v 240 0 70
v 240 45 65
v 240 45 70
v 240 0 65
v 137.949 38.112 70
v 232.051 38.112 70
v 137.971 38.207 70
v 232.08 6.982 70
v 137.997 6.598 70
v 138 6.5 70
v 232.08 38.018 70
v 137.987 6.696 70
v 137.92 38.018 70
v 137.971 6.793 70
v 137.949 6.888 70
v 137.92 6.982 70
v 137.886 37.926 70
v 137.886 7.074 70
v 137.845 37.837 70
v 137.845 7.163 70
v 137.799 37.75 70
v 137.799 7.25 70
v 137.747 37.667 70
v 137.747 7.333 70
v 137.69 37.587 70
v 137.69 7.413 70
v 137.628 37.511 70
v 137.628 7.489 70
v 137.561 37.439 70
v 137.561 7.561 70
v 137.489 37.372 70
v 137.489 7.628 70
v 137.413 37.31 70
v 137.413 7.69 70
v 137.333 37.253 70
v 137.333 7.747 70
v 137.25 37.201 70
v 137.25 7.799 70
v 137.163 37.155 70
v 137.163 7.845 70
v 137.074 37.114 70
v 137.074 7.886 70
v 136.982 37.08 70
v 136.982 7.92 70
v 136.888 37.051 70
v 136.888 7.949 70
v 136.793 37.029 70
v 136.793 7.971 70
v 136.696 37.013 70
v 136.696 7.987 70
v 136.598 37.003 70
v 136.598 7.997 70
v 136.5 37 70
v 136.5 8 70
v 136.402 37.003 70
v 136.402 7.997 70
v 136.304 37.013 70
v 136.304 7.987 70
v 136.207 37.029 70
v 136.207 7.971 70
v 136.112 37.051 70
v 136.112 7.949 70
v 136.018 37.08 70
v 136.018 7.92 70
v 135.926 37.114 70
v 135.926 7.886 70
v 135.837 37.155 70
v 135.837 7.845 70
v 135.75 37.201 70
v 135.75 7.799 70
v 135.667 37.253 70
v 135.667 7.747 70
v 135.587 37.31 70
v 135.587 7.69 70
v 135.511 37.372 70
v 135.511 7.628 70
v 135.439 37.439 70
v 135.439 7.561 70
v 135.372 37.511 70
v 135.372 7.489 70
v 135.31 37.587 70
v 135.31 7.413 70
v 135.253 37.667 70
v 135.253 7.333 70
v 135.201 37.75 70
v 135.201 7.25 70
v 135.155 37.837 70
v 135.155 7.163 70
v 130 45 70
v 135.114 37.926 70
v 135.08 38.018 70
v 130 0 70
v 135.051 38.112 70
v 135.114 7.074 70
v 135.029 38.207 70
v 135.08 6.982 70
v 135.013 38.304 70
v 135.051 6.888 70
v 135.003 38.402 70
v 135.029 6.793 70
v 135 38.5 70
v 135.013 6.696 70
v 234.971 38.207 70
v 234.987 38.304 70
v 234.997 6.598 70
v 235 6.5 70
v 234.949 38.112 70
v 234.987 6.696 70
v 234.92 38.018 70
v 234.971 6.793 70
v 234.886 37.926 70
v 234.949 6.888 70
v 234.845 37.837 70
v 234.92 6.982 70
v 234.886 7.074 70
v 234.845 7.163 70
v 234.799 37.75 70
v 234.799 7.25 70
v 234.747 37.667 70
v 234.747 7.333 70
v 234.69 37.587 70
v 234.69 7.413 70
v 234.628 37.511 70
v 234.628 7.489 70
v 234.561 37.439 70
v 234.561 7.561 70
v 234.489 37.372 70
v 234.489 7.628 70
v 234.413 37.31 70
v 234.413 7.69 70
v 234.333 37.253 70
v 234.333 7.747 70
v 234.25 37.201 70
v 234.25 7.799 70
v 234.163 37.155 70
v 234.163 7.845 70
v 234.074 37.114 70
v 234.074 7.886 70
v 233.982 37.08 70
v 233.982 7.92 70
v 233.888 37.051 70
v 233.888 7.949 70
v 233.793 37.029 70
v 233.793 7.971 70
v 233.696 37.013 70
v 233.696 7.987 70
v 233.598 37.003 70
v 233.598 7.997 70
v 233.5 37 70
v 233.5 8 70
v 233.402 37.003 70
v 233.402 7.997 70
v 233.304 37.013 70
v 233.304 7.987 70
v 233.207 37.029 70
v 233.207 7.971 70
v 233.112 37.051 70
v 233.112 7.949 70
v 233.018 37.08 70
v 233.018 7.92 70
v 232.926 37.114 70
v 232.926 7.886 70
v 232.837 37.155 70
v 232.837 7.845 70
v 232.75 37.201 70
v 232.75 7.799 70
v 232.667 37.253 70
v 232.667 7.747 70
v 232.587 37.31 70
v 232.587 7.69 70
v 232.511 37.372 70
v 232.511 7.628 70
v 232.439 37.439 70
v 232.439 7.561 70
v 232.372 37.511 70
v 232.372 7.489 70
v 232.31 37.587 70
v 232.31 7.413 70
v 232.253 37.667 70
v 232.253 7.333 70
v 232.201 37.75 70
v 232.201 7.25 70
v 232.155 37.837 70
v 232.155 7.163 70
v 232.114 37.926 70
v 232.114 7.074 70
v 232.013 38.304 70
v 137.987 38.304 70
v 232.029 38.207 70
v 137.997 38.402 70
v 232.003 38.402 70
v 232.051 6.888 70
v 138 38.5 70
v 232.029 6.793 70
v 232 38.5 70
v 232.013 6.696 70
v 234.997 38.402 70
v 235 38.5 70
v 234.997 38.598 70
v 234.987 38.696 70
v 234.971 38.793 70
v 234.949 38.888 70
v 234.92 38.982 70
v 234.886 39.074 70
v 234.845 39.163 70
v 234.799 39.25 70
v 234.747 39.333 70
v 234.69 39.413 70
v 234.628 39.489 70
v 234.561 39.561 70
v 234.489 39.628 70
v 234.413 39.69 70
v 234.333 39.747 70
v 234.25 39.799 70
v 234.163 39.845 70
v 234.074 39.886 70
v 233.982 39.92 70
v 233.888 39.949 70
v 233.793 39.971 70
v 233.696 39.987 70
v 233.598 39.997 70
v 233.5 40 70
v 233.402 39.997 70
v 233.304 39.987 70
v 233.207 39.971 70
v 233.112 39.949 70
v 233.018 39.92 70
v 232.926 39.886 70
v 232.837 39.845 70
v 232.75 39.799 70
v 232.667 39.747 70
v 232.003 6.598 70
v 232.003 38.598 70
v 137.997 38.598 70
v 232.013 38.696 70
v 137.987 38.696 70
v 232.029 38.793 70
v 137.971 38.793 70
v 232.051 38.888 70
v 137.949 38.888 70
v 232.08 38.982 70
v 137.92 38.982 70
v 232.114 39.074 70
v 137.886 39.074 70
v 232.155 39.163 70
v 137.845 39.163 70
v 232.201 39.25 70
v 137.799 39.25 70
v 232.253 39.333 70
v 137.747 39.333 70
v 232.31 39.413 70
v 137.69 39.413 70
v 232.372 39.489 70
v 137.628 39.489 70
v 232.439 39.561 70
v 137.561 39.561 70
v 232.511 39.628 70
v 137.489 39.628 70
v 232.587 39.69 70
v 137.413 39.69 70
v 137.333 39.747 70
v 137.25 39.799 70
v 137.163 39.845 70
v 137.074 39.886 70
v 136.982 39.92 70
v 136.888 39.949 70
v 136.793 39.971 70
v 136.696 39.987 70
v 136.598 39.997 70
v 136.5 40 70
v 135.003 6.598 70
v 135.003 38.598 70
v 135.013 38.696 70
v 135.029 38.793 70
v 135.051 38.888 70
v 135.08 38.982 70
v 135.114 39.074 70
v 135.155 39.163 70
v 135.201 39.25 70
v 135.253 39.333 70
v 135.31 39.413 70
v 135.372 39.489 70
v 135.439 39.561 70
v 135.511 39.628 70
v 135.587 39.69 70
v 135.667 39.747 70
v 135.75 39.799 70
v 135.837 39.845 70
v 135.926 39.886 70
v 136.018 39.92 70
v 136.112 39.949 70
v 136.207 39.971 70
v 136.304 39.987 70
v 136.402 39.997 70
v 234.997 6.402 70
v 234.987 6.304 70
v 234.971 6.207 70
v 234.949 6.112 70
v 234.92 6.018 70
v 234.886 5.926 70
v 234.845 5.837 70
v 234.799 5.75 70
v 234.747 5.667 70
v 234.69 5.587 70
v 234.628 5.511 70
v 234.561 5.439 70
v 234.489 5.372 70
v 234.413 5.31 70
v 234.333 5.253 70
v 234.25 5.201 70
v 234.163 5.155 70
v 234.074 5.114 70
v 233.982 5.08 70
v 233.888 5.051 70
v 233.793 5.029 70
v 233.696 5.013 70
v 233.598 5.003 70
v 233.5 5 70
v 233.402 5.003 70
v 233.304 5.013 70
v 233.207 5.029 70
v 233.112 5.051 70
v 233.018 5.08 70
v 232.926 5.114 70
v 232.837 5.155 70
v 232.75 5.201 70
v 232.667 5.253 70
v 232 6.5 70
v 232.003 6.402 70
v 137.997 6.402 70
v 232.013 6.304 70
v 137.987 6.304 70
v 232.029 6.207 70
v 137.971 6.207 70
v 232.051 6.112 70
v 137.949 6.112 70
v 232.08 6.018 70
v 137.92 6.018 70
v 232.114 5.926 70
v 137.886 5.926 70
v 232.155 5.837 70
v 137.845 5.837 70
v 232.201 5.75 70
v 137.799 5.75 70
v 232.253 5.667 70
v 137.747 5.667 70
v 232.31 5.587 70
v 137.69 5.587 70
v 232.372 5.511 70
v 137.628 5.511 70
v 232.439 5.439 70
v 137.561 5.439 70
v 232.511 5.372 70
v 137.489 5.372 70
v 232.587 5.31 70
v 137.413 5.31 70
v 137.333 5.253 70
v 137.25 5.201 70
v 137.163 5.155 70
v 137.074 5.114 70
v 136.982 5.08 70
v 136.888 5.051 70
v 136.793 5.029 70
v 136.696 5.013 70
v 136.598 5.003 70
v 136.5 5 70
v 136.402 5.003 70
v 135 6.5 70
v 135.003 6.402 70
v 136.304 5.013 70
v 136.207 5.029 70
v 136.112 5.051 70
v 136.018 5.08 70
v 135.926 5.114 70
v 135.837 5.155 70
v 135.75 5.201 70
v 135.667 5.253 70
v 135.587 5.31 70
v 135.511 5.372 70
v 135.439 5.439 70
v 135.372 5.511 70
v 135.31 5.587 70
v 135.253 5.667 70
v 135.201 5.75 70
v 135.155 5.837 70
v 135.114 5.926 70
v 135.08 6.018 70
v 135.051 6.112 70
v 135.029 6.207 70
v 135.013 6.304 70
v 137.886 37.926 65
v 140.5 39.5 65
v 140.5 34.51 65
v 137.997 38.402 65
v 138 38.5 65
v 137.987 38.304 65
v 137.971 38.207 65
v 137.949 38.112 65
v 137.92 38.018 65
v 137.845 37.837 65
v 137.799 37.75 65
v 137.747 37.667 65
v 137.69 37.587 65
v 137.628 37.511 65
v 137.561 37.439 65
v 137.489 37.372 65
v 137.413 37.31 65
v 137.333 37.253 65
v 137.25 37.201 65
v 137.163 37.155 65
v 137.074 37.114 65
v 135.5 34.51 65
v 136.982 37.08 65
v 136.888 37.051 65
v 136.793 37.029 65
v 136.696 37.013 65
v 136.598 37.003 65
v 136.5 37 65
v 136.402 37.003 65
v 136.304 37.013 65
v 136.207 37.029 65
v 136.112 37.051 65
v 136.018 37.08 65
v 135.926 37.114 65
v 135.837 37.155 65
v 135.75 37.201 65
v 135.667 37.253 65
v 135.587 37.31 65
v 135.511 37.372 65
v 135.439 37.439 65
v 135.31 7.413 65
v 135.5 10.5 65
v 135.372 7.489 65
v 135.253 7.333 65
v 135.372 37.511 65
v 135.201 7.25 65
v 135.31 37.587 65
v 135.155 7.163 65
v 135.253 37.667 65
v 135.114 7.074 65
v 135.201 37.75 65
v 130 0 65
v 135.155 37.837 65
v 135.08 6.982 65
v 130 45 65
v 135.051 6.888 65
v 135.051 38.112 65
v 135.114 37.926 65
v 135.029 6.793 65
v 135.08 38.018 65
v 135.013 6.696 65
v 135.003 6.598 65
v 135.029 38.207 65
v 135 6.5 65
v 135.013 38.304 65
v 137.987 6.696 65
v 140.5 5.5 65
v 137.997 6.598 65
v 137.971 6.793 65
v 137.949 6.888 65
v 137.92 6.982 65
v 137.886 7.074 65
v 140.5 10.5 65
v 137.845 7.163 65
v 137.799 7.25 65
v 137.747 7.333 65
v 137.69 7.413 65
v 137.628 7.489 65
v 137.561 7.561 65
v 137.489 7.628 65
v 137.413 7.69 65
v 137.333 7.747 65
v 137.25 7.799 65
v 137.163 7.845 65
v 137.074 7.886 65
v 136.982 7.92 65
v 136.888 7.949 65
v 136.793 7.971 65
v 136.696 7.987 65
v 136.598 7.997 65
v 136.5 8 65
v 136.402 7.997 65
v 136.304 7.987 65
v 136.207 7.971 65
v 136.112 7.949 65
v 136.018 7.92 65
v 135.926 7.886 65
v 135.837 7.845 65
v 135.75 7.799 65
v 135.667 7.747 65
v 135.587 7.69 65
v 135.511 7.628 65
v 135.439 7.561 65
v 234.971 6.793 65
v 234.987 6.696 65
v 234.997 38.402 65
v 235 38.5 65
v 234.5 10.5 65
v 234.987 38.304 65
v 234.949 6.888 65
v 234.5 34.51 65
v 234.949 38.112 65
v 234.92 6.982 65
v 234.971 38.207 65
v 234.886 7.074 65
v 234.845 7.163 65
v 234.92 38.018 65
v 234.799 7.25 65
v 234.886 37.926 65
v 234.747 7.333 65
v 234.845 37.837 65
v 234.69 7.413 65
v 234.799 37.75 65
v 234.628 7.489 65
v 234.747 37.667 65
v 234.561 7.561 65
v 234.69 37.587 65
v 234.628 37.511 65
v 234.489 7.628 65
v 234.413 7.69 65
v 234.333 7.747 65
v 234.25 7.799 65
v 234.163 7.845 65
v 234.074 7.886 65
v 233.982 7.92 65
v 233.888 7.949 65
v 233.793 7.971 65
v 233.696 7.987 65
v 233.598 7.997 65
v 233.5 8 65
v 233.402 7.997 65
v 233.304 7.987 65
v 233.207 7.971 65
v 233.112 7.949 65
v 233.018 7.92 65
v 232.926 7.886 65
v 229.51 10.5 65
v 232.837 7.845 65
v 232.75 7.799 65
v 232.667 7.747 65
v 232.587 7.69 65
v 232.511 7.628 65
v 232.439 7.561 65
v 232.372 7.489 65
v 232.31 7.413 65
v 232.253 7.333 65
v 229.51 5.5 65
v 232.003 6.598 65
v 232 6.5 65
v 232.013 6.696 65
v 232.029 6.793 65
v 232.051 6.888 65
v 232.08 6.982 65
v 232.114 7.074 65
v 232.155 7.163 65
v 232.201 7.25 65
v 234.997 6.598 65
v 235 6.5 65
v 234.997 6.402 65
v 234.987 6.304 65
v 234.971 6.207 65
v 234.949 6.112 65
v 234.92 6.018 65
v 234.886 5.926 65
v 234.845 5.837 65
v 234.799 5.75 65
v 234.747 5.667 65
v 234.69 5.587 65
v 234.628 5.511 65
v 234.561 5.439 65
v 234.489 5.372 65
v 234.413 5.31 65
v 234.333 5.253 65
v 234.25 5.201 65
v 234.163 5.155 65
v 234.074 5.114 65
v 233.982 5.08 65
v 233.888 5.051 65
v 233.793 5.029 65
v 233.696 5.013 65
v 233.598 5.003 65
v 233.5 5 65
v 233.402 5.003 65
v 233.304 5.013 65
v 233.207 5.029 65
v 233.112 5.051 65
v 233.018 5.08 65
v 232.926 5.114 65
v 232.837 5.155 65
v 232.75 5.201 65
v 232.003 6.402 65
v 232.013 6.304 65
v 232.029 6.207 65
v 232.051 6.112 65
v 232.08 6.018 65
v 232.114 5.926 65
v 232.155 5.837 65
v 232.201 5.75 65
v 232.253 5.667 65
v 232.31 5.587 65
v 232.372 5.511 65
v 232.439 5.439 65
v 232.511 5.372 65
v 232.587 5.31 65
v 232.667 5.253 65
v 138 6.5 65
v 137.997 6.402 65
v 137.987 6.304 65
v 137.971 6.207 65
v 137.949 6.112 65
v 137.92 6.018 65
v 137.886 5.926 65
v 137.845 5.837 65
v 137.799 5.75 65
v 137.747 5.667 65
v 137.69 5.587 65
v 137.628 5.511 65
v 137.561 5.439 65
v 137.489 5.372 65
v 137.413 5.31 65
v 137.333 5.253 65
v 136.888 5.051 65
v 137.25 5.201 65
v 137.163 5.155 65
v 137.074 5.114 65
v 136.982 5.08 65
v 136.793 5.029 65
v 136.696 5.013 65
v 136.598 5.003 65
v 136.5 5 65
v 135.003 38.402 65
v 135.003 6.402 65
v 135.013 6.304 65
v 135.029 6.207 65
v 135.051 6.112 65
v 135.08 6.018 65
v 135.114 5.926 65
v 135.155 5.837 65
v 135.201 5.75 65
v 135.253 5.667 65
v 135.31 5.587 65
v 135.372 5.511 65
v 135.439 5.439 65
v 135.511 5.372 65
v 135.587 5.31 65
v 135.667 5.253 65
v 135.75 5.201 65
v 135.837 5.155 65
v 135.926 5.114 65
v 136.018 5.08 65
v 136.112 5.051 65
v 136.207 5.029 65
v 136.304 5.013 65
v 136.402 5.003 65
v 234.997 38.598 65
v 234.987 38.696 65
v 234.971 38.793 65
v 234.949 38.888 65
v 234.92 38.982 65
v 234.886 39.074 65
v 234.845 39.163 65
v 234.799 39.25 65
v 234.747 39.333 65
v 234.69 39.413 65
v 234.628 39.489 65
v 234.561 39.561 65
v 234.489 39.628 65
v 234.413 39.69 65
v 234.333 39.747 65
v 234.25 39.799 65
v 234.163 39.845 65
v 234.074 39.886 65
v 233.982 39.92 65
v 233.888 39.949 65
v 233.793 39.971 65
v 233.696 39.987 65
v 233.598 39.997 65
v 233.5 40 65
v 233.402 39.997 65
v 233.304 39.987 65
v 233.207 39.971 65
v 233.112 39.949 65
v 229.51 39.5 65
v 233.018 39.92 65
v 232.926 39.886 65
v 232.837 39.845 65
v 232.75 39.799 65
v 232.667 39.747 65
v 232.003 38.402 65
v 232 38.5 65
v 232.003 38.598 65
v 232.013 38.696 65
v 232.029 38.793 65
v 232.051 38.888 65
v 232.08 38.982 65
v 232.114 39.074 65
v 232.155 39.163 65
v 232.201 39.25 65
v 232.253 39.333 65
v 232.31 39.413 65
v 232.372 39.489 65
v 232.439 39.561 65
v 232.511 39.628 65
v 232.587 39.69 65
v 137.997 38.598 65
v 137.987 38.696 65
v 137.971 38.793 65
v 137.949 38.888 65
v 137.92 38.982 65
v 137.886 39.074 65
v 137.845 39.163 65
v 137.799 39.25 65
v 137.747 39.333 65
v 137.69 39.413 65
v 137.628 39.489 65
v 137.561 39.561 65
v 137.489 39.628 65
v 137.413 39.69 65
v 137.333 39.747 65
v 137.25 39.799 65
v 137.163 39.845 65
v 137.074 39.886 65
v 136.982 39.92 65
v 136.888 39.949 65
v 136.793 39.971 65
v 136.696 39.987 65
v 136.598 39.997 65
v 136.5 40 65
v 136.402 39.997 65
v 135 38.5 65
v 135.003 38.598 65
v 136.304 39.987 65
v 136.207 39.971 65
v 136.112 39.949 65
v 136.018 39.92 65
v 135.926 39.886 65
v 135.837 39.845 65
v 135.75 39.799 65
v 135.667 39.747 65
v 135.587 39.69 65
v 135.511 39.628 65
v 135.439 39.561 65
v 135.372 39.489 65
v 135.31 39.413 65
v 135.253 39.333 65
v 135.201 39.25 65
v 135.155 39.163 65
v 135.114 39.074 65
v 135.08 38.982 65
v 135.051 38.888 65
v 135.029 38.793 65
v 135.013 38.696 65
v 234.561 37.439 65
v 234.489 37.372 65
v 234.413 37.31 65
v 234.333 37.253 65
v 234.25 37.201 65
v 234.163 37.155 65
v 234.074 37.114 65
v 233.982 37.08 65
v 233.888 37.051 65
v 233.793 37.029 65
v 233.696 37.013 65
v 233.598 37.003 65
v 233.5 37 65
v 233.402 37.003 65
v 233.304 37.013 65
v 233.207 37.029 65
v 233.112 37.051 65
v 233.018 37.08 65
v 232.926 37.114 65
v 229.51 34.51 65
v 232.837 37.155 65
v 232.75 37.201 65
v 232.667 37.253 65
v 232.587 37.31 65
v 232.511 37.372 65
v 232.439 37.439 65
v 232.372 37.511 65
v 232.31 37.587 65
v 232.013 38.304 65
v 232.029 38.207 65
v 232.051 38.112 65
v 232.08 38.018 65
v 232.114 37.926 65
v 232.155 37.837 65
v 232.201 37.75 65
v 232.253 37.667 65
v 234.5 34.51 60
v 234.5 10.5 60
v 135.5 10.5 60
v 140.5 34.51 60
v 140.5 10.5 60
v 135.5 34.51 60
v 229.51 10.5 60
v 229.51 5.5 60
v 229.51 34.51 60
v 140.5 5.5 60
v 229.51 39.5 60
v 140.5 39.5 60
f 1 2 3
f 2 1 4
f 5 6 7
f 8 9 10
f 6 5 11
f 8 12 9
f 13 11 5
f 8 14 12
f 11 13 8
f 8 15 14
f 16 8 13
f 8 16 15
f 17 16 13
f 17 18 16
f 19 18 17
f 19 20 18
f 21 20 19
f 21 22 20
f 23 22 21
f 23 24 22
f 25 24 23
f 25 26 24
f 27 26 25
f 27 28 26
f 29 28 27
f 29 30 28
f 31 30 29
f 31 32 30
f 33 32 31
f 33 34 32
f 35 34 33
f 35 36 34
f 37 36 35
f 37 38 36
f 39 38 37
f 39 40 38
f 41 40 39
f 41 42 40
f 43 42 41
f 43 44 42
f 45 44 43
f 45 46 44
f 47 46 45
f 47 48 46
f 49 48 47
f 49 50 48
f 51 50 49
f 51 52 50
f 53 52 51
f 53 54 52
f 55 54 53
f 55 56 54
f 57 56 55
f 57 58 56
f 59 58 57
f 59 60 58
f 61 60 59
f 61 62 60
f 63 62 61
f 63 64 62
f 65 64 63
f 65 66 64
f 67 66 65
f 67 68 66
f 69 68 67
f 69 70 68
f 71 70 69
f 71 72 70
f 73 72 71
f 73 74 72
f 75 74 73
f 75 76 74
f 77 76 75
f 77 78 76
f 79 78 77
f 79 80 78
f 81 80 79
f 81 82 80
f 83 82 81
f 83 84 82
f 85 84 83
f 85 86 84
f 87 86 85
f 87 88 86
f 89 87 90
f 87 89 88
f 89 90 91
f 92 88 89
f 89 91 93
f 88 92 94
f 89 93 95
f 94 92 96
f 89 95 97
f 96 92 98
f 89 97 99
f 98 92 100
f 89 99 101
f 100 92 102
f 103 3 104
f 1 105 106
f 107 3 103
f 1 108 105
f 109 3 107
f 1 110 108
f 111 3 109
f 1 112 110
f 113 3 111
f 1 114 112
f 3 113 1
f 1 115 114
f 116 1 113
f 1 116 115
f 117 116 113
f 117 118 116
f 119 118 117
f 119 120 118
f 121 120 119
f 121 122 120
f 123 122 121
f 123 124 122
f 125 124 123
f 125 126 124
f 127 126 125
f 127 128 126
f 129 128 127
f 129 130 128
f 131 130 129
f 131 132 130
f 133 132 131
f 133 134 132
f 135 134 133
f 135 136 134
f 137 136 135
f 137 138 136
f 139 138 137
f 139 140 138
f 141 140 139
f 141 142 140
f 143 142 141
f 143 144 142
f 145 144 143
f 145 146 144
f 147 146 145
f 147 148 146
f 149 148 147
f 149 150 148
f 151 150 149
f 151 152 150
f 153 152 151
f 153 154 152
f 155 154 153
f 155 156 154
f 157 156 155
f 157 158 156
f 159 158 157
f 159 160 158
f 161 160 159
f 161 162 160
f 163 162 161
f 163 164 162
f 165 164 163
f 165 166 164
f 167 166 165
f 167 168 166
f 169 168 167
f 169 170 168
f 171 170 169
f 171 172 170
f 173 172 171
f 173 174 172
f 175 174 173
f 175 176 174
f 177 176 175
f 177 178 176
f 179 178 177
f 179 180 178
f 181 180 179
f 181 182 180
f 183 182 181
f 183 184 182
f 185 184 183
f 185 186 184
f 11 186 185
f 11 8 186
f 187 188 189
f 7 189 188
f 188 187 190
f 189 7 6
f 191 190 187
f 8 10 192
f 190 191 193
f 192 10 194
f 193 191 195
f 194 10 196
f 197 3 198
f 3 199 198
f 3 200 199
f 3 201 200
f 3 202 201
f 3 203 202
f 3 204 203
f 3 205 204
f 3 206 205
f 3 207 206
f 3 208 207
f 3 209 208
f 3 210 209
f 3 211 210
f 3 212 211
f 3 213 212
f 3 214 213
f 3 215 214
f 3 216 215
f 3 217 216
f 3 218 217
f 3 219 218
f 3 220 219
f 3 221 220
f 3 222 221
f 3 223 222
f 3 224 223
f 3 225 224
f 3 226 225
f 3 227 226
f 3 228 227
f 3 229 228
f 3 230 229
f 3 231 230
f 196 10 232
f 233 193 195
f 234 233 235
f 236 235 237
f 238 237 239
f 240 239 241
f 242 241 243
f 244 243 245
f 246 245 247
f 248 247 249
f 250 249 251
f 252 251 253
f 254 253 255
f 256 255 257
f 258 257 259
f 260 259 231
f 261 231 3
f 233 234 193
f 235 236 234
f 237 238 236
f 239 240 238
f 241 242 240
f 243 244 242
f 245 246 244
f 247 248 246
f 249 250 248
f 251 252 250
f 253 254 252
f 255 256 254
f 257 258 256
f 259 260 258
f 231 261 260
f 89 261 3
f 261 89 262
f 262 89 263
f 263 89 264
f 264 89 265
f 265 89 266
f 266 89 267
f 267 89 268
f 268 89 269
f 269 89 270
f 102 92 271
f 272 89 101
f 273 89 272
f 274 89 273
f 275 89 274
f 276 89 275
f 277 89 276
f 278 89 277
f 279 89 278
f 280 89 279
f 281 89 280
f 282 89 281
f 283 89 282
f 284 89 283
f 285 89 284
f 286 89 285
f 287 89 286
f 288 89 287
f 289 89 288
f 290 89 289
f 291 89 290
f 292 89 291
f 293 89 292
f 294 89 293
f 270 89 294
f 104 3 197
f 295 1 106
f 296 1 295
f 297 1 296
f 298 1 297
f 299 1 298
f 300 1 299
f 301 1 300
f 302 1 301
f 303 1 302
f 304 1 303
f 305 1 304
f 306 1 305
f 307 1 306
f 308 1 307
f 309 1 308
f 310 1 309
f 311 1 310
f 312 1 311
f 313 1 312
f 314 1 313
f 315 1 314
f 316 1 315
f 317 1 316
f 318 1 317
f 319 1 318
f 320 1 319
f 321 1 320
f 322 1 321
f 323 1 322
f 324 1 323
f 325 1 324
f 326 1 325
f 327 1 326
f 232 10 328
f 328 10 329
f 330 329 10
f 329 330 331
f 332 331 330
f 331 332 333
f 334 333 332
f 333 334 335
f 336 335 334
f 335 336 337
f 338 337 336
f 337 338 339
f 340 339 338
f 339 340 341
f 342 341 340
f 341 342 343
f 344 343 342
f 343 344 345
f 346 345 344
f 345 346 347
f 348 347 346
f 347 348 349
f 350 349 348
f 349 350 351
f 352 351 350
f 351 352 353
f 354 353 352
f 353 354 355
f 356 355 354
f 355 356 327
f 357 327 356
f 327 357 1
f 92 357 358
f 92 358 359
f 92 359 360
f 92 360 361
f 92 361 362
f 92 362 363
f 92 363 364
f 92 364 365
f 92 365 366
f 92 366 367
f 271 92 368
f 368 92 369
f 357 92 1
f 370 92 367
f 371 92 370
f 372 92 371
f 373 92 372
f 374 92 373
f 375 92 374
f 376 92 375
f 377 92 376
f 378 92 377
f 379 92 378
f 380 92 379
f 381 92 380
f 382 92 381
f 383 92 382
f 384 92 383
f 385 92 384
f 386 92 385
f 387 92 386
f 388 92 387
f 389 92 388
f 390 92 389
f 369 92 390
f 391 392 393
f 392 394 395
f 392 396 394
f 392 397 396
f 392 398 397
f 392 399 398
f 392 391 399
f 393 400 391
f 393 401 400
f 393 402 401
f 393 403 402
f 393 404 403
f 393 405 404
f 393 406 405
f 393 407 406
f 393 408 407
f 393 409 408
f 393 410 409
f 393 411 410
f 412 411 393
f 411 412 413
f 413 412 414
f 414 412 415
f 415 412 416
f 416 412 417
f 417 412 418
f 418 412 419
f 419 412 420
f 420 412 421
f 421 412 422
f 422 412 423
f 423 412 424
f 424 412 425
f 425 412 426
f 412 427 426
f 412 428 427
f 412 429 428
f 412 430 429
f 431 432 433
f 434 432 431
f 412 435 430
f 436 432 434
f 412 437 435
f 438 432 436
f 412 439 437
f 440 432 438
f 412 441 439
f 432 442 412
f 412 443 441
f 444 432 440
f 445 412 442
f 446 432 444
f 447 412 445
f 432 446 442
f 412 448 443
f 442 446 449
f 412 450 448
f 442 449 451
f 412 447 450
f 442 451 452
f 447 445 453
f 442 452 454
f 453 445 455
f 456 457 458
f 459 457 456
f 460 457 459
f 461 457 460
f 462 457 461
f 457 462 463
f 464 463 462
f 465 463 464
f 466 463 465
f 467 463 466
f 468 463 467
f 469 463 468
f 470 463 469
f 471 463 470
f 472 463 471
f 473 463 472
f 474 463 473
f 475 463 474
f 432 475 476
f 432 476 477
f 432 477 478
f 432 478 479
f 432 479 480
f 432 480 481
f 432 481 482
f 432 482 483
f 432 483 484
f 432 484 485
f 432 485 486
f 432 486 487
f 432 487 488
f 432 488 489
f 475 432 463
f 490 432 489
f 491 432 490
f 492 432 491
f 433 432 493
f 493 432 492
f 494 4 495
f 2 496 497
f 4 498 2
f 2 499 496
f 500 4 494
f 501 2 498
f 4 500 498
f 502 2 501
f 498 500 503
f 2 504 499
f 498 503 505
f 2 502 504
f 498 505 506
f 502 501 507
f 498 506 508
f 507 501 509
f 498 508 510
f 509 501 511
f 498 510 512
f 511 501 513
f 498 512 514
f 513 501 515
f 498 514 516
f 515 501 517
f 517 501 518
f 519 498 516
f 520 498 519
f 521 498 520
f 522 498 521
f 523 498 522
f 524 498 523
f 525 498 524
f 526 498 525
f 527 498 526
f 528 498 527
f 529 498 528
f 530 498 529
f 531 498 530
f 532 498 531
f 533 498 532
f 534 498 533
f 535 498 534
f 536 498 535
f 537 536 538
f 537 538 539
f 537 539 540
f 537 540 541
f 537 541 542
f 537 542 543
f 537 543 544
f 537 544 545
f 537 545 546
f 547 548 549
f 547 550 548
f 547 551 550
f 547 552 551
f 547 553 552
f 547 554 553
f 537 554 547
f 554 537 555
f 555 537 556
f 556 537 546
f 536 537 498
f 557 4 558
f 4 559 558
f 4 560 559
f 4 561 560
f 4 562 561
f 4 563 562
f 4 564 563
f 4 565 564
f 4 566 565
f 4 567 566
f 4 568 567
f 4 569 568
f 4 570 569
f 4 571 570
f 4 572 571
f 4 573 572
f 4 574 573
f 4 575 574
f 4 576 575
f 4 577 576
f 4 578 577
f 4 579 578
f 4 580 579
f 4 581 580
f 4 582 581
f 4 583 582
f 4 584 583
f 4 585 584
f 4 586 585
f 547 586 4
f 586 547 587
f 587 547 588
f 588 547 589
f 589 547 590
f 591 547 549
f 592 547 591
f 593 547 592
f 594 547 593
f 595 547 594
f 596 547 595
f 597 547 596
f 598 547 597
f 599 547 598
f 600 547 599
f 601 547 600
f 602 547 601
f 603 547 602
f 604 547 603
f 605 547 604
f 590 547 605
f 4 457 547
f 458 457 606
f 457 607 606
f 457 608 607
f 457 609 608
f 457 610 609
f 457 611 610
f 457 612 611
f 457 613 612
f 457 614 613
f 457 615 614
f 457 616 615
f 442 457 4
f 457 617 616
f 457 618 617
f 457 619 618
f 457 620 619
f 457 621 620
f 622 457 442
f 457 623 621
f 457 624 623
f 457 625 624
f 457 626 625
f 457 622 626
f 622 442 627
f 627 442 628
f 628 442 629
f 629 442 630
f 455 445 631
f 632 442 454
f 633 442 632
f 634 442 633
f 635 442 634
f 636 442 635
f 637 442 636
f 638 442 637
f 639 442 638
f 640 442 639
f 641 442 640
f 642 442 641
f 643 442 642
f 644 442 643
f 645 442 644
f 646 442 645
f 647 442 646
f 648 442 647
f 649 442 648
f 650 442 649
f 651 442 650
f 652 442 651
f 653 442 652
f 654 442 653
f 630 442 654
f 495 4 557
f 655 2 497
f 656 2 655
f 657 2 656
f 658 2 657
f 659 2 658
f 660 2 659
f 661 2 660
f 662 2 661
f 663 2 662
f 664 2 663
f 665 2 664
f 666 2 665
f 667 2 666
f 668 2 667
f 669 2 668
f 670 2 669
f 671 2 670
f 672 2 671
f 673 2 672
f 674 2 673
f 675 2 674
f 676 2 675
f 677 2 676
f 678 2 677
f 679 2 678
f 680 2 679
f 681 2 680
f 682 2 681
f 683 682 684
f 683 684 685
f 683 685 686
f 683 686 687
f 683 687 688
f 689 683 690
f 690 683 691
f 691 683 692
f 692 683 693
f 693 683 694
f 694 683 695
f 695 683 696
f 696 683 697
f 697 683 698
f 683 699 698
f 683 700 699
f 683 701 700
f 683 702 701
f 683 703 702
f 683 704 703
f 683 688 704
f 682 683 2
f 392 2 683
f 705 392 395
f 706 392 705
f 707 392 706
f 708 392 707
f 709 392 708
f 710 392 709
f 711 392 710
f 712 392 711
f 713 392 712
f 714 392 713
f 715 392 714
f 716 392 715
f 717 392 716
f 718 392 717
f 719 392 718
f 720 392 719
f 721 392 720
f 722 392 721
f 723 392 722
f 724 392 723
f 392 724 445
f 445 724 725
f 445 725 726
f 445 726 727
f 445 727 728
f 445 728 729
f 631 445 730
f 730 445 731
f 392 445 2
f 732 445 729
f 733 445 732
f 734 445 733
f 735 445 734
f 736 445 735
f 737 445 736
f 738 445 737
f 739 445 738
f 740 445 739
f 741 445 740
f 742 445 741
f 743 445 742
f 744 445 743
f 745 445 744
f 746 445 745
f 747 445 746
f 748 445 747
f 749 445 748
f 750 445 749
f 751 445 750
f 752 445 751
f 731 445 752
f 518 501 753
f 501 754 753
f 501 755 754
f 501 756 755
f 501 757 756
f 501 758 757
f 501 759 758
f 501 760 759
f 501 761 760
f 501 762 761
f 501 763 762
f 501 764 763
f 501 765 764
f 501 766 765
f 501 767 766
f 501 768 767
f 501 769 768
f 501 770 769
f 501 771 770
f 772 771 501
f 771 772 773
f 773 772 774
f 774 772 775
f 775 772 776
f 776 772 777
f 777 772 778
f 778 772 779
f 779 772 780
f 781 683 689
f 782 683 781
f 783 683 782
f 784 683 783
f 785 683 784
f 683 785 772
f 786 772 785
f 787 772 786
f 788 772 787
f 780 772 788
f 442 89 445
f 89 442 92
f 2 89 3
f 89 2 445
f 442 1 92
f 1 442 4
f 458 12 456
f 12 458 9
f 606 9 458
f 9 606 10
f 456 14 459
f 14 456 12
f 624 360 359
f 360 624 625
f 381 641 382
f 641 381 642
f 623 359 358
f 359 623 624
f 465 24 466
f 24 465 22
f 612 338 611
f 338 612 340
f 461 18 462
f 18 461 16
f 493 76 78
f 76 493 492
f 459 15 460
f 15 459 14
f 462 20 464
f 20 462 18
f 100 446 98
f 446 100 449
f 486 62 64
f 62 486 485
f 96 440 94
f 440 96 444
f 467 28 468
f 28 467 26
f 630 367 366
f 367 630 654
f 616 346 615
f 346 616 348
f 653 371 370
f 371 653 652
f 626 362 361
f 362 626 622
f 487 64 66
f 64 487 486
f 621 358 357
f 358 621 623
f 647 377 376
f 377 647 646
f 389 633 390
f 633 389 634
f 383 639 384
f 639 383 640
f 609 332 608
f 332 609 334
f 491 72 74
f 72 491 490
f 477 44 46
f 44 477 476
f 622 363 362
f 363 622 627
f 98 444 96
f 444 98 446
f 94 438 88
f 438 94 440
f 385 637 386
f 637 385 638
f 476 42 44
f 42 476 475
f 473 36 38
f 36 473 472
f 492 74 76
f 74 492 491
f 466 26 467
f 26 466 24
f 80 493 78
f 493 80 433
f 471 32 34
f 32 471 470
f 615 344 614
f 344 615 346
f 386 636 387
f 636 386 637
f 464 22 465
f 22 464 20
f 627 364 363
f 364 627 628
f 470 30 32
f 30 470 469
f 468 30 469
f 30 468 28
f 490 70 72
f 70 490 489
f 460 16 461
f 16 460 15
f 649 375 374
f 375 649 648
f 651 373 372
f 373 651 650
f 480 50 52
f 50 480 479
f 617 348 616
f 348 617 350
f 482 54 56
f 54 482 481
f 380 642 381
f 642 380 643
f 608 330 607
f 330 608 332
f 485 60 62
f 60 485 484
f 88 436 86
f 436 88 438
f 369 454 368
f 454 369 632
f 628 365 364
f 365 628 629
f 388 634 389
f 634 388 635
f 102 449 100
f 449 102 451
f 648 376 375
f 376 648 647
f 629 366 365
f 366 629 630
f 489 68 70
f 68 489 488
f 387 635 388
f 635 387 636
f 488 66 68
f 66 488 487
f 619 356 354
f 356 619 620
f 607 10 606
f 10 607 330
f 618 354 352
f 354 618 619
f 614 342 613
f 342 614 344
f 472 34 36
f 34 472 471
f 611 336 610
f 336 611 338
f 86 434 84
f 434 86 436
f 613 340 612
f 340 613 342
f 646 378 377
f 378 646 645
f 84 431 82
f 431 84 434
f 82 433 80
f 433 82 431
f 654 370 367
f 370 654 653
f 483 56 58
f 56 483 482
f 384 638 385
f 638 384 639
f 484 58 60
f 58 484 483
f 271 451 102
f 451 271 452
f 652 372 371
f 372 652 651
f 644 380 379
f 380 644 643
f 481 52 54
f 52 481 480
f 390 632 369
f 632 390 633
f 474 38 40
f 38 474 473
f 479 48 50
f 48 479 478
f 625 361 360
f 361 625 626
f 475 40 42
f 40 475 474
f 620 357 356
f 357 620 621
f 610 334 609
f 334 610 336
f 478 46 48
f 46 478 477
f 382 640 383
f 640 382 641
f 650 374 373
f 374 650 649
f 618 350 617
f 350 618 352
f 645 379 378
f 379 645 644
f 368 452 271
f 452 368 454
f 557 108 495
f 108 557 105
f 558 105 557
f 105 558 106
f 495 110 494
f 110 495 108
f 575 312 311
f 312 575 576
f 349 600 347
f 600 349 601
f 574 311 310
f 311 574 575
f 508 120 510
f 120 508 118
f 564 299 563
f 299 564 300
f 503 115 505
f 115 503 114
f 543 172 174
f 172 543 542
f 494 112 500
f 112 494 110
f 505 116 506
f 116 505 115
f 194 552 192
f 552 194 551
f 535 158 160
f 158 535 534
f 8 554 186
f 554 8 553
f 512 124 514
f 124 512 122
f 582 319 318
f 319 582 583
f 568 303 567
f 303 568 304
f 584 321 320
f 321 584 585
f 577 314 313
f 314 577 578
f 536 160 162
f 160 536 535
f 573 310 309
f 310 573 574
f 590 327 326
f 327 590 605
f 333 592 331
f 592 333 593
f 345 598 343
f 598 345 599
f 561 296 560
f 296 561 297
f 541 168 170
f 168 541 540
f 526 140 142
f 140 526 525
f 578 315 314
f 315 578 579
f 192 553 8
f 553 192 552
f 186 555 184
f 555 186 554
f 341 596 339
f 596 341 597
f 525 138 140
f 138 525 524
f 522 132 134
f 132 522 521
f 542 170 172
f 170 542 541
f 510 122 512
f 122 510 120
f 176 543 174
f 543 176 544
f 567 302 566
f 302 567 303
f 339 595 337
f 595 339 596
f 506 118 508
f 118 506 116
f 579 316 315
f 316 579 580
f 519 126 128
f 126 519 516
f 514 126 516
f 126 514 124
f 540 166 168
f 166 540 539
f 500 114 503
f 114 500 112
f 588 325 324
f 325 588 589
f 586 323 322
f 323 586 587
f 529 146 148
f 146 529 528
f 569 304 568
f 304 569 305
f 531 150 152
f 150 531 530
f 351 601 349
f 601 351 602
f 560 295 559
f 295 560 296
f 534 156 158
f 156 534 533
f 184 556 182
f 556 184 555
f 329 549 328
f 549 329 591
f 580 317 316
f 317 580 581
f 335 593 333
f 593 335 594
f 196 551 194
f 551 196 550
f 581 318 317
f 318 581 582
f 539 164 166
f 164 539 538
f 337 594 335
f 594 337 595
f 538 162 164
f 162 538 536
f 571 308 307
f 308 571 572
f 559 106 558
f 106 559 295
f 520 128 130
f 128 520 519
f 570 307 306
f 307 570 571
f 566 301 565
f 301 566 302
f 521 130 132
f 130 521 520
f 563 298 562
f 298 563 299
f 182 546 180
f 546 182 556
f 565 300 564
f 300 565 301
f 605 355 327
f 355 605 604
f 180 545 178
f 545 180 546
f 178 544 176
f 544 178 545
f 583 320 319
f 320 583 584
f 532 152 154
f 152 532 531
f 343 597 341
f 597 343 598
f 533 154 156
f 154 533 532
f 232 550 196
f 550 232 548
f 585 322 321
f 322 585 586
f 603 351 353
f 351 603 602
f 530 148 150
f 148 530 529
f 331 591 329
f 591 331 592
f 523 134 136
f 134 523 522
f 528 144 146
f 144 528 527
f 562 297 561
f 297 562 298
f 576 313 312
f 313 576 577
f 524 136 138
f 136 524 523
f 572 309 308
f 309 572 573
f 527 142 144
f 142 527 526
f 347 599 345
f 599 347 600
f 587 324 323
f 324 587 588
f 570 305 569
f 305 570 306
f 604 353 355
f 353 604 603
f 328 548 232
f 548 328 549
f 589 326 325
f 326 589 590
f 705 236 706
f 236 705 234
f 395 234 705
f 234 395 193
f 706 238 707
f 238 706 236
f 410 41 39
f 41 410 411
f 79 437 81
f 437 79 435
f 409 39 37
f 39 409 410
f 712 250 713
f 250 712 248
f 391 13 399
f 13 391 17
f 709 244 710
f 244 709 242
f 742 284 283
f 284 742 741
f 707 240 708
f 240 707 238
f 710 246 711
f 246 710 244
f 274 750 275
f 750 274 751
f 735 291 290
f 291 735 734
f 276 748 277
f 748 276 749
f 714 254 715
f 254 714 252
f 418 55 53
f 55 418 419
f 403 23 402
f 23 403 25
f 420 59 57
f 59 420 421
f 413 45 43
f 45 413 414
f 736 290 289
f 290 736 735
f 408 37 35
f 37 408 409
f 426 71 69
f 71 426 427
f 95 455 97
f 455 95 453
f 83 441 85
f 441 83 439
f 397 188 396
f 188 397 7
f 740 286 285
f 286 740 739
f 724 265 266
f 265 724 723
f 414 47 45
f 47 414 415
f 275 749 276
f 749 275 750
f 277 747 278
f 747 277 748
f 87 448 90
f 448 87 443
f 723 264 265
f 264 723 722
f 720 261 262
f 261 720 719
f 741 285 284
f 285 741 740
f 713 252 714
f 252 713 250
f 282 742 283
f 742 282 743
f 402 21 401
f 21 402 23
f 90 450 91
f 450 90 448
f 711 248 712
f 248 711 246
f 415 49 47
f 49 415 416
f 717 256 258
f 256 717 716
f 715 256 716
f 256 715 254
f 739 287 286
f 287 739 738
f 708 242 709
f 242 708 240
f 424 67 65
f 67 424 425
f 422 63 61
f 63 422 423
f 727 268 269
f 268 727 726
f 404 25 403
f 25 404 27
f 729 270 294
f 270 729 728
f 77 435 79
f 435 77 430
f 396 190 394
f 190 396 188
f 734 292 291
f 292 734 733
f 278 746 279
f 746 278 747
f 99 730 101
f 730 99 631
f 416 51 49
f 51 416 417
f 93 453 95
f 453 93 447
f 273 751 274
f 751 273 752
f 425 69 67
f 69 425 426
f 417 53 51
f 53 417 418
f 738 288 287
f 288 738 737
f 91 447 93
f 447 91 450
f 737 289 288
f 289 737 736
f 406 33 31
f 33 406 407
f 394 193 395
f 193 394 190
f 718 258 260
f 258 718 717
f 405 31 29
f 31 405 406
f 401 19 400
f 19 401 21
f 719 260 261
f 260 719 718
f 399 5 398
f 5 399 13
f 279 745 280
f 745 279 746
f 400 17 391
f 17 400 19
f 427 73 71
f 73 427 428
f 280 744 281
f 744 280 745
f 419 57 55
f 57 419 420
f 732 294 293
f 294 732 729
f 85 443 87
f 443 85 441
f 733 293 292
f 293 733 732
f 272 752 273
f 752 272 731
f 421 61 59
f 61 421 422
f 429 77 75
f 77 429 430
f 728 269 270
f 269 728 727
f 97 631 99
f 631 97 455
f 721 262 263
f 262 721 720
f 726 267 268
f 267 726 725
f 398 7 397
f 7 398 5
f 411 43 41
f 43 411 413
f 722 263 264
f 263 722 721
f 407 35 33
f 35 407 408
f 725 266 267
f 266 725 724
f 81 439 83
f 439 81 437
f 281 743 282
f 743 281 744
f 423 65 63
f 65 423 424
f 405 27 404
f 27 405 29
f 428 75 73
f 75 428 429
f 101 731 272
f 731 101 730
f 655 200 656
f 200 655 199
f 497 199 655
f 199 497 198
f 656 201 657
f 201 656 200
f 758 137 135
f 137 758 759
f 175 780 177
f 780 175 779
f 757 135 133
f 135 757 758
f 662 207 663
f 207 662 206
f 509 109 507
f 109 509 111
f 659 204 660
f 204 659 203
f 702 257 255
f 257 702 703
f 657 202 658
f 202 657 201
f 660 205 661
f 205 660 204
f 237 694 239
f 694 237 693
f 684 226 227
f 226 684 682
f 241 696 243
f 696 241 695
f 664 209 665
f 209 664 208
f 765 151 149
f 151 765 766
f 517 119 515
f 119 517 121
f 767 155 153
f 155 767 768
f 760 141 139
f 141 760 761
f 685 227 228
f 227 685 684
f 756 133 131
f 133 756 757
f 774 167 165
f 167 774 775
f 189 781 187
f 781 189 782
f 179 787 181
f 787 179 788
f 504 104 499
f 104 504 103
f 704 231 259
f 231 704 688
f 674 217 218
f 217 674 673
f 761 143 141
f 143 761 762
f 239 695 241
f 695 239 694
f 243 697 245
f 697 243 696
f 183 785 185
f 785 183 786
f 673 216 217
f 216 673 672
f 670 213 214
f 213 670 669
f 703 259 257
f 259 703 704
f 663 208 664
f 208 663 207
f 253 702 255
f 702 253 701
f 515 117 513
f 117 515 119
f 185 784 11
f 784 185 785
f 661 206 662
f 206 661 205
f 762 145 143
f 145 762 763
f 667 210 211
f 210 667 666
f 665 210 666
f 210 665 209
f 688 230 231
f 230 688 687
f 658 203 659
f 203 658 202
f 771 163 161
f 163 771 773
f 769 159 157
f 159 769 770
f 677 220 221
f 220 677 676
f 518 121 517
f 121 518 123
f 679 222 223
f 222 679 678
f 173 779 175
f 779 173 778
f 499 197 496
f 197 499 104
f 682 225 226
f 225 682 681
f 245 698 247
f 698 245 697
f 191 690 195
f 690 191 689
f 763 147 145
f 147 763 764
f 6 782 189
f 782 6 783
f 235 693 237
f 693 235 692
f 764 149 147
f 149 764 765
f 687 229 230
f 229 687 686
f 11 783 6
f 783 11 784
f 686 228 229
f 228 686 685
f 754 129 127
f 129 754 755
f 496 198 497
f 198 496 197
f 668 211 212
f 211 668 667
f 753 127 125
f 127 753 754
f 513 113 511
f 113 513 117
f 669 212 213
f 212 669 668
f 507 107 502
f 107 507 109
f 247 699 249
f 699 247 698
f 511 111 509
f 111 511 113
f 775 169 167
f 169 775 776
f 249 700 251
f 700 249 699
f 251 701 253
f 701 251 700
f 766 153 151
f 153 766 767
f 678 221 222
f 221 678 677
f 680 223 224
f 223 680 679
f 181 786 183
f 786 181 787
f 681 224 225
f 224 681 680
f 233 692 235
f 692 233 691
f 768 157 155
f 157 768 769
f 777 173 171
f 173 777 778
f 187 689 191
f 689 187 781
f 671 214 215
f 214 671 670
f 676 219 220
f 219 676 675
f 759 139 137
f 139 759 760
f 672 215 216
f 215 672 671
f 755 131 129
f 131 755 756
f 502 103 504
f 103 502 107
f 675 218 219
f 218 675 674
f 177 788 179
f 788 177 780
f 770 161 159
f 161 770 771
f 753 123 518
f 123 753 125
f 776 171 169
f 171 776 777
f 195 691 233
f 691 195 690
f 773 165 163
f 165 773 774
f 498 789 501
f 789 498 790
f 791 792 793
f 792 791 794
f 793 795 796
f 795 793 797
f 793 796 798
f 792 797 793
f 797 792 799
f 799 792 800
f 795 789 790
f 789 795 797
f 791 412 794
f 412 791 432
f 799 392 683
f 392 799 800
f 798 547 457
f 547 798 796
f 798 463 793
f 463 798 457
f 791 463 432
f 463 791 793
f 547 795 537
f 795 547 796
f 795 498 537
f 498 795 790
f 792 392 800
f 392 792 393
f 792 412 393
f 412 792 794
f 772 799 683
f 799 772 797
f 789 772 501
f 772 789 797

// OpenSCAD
$fn=96;
eps=0.01;

// Dimensions are inner
module box_base(x, y, z, wall=4) {
        
    difference() {
       cube([x+2*wall, y+2*wall, z+wall]);
       translate([wall, wall, wall])
            cube([x, y, z+eps]);
    };
}



module screwpost(z, id, od) {
    difference() {
            union() {
                translate([-od/2, 0, 0])
                    cube([od/2, od/2, z]);
                translate([0, -od/2, 0])
                    cube([od/2, od/2, z]);
                cylinder(h=z, d=od);
            }
            thread_forming_hole(id, z);
        };
}

module threadform(id, z) {
    translate([id/2, id/2, 4*z/5])
        cylinder(h=z/5, d1=id*0.7, d2=id*0.45);
    translate([id/2, id/2, 0])
        cylinder(h=4*z/5, d=id*0.7);
};

module thread_forming_hole(id, z) {
    translate([0, 0, -eps])
    difference() {
        cylinder(h=z+2*eps, d=id);
        rotate([0, 0, 0])
            threadform(id, z+2*eps);
        rotate([0, 0, 120])
            threadform(id, z+2*eps);
        rotate([0, 0, 240])
            threadform(id, z+2*eps);
    }
}


module box_screwposts(x, y, z, wall, id, od) {
    inoff = id/2;
    
    translate([wall+inoff, wall+inoff, wall])
        screwpost(z, id, od);
    
    translate([wall+x-inoff, wall+inoff, wall])
        rotate([0,0,90])
        screwpost(z, id, od);
    translate([wall+inoff, wall+y-inoff, wall])
        rotate([0,0,90])
        screwpost(z, id, od);
    
    translate([wall+x-inoff, wall+y-inoff, wall])
        screwpost(z, id, od);
    
}

module box_lid(x, y, inset, wall, id, od, gap=0.5) {
    // upper
    difference() {
        cube([x+2*wall, y+2*wall, wall]);
        translate([wall+id/2, wall+id/2, -eps])
            cylinder(h=wall+2*eps, d=id);
        translate([x + wall-id/2, wall+id/2, -eps])
            cylinder(h=wall+2*eps, d=id);
        translate([wall+id/2, y + wall-id/2, -eps])
            cylinder(h=wall+2*eps, d=id);
        translate([x+wall-id/2, y + wall-id/2, -eps])
            cylinder(h=wall+2*eps, d=id);
    }
    //lower
    translate([0, 0, -wall])
    difference() {
        translate([wall+gap, wall+gap, 0])
            cube([x-2*gap, y-2*gap, wall]);
        
        square = id + (od-id)/2 + gap;
        translate([wall+gap-eps, wall+gap-eps, -eps])
            cube([square+eps, square+eps, wall+2*eps]);
        
        translate([x+wall-gap-square+eps, wall+gap-eps, -eps])
            cube([square+eps, square+eps, wall+2*eps]);
        
        translate([wall+gap-eps, y+wall-gap-square+eps, -eps])
            cube([square+eps, square+eps, wall+2*eps]);
        
        translate([x+wall-gap-square+eps, y+wall-gap-square+eps, -eps])
            cube([square+eps, square+eps, wall+2*eps]);
    }
}

x = 100; y=35; z=55; wall=5; screw=3;

usb_w=28;
usb_h=35;
usb_off_bottom=8;
n_usb= 3;
hole_to_edge = wall + 2*screw + (x-4*screw)/2 - (n_usb* usb_w)/2 + usb_w/2;
hole_to_bottom =  wall + (z-usb_off_bottom-usb_h)/2 + usb_h/2 + usb_off_bottom;
/*
difference() {
    union() {
        box_base(x, y, z, wall);
        box_screwposts(x, y, z, wall, screw, screw*2);
    }

    for(i = [0:2]) {
    translate([hole_to_edge + i*usb_w, 0,  hole_to_bottom])
        usb_module_hole();
    }
}

*/    
translate([x+4*wall+10, 0, z+wall+5]) box_lid(x, y, wall, wall, screw, screw*2);

// Holes

module usb_module_hole(w=19.5, h=22, depth=10, lip_depth=0.8, lip_w=0, lip_h=1, gap=0.5) {
    translate([-(w+2*gap+2*lip_w)/2, -eps, -(h+2*gap+2*lip_h)/2])
    union() {
        translate([0, lip_depth-eps, 0])
            cube([w+2*gap+2*lip_w,  depth, h+2*gap+2*lip_h,]);
        translate([lip_w, 0, lip_h])
        cube([w+2*gap, lip_depth, h+2*gap]);
    }
    
}
